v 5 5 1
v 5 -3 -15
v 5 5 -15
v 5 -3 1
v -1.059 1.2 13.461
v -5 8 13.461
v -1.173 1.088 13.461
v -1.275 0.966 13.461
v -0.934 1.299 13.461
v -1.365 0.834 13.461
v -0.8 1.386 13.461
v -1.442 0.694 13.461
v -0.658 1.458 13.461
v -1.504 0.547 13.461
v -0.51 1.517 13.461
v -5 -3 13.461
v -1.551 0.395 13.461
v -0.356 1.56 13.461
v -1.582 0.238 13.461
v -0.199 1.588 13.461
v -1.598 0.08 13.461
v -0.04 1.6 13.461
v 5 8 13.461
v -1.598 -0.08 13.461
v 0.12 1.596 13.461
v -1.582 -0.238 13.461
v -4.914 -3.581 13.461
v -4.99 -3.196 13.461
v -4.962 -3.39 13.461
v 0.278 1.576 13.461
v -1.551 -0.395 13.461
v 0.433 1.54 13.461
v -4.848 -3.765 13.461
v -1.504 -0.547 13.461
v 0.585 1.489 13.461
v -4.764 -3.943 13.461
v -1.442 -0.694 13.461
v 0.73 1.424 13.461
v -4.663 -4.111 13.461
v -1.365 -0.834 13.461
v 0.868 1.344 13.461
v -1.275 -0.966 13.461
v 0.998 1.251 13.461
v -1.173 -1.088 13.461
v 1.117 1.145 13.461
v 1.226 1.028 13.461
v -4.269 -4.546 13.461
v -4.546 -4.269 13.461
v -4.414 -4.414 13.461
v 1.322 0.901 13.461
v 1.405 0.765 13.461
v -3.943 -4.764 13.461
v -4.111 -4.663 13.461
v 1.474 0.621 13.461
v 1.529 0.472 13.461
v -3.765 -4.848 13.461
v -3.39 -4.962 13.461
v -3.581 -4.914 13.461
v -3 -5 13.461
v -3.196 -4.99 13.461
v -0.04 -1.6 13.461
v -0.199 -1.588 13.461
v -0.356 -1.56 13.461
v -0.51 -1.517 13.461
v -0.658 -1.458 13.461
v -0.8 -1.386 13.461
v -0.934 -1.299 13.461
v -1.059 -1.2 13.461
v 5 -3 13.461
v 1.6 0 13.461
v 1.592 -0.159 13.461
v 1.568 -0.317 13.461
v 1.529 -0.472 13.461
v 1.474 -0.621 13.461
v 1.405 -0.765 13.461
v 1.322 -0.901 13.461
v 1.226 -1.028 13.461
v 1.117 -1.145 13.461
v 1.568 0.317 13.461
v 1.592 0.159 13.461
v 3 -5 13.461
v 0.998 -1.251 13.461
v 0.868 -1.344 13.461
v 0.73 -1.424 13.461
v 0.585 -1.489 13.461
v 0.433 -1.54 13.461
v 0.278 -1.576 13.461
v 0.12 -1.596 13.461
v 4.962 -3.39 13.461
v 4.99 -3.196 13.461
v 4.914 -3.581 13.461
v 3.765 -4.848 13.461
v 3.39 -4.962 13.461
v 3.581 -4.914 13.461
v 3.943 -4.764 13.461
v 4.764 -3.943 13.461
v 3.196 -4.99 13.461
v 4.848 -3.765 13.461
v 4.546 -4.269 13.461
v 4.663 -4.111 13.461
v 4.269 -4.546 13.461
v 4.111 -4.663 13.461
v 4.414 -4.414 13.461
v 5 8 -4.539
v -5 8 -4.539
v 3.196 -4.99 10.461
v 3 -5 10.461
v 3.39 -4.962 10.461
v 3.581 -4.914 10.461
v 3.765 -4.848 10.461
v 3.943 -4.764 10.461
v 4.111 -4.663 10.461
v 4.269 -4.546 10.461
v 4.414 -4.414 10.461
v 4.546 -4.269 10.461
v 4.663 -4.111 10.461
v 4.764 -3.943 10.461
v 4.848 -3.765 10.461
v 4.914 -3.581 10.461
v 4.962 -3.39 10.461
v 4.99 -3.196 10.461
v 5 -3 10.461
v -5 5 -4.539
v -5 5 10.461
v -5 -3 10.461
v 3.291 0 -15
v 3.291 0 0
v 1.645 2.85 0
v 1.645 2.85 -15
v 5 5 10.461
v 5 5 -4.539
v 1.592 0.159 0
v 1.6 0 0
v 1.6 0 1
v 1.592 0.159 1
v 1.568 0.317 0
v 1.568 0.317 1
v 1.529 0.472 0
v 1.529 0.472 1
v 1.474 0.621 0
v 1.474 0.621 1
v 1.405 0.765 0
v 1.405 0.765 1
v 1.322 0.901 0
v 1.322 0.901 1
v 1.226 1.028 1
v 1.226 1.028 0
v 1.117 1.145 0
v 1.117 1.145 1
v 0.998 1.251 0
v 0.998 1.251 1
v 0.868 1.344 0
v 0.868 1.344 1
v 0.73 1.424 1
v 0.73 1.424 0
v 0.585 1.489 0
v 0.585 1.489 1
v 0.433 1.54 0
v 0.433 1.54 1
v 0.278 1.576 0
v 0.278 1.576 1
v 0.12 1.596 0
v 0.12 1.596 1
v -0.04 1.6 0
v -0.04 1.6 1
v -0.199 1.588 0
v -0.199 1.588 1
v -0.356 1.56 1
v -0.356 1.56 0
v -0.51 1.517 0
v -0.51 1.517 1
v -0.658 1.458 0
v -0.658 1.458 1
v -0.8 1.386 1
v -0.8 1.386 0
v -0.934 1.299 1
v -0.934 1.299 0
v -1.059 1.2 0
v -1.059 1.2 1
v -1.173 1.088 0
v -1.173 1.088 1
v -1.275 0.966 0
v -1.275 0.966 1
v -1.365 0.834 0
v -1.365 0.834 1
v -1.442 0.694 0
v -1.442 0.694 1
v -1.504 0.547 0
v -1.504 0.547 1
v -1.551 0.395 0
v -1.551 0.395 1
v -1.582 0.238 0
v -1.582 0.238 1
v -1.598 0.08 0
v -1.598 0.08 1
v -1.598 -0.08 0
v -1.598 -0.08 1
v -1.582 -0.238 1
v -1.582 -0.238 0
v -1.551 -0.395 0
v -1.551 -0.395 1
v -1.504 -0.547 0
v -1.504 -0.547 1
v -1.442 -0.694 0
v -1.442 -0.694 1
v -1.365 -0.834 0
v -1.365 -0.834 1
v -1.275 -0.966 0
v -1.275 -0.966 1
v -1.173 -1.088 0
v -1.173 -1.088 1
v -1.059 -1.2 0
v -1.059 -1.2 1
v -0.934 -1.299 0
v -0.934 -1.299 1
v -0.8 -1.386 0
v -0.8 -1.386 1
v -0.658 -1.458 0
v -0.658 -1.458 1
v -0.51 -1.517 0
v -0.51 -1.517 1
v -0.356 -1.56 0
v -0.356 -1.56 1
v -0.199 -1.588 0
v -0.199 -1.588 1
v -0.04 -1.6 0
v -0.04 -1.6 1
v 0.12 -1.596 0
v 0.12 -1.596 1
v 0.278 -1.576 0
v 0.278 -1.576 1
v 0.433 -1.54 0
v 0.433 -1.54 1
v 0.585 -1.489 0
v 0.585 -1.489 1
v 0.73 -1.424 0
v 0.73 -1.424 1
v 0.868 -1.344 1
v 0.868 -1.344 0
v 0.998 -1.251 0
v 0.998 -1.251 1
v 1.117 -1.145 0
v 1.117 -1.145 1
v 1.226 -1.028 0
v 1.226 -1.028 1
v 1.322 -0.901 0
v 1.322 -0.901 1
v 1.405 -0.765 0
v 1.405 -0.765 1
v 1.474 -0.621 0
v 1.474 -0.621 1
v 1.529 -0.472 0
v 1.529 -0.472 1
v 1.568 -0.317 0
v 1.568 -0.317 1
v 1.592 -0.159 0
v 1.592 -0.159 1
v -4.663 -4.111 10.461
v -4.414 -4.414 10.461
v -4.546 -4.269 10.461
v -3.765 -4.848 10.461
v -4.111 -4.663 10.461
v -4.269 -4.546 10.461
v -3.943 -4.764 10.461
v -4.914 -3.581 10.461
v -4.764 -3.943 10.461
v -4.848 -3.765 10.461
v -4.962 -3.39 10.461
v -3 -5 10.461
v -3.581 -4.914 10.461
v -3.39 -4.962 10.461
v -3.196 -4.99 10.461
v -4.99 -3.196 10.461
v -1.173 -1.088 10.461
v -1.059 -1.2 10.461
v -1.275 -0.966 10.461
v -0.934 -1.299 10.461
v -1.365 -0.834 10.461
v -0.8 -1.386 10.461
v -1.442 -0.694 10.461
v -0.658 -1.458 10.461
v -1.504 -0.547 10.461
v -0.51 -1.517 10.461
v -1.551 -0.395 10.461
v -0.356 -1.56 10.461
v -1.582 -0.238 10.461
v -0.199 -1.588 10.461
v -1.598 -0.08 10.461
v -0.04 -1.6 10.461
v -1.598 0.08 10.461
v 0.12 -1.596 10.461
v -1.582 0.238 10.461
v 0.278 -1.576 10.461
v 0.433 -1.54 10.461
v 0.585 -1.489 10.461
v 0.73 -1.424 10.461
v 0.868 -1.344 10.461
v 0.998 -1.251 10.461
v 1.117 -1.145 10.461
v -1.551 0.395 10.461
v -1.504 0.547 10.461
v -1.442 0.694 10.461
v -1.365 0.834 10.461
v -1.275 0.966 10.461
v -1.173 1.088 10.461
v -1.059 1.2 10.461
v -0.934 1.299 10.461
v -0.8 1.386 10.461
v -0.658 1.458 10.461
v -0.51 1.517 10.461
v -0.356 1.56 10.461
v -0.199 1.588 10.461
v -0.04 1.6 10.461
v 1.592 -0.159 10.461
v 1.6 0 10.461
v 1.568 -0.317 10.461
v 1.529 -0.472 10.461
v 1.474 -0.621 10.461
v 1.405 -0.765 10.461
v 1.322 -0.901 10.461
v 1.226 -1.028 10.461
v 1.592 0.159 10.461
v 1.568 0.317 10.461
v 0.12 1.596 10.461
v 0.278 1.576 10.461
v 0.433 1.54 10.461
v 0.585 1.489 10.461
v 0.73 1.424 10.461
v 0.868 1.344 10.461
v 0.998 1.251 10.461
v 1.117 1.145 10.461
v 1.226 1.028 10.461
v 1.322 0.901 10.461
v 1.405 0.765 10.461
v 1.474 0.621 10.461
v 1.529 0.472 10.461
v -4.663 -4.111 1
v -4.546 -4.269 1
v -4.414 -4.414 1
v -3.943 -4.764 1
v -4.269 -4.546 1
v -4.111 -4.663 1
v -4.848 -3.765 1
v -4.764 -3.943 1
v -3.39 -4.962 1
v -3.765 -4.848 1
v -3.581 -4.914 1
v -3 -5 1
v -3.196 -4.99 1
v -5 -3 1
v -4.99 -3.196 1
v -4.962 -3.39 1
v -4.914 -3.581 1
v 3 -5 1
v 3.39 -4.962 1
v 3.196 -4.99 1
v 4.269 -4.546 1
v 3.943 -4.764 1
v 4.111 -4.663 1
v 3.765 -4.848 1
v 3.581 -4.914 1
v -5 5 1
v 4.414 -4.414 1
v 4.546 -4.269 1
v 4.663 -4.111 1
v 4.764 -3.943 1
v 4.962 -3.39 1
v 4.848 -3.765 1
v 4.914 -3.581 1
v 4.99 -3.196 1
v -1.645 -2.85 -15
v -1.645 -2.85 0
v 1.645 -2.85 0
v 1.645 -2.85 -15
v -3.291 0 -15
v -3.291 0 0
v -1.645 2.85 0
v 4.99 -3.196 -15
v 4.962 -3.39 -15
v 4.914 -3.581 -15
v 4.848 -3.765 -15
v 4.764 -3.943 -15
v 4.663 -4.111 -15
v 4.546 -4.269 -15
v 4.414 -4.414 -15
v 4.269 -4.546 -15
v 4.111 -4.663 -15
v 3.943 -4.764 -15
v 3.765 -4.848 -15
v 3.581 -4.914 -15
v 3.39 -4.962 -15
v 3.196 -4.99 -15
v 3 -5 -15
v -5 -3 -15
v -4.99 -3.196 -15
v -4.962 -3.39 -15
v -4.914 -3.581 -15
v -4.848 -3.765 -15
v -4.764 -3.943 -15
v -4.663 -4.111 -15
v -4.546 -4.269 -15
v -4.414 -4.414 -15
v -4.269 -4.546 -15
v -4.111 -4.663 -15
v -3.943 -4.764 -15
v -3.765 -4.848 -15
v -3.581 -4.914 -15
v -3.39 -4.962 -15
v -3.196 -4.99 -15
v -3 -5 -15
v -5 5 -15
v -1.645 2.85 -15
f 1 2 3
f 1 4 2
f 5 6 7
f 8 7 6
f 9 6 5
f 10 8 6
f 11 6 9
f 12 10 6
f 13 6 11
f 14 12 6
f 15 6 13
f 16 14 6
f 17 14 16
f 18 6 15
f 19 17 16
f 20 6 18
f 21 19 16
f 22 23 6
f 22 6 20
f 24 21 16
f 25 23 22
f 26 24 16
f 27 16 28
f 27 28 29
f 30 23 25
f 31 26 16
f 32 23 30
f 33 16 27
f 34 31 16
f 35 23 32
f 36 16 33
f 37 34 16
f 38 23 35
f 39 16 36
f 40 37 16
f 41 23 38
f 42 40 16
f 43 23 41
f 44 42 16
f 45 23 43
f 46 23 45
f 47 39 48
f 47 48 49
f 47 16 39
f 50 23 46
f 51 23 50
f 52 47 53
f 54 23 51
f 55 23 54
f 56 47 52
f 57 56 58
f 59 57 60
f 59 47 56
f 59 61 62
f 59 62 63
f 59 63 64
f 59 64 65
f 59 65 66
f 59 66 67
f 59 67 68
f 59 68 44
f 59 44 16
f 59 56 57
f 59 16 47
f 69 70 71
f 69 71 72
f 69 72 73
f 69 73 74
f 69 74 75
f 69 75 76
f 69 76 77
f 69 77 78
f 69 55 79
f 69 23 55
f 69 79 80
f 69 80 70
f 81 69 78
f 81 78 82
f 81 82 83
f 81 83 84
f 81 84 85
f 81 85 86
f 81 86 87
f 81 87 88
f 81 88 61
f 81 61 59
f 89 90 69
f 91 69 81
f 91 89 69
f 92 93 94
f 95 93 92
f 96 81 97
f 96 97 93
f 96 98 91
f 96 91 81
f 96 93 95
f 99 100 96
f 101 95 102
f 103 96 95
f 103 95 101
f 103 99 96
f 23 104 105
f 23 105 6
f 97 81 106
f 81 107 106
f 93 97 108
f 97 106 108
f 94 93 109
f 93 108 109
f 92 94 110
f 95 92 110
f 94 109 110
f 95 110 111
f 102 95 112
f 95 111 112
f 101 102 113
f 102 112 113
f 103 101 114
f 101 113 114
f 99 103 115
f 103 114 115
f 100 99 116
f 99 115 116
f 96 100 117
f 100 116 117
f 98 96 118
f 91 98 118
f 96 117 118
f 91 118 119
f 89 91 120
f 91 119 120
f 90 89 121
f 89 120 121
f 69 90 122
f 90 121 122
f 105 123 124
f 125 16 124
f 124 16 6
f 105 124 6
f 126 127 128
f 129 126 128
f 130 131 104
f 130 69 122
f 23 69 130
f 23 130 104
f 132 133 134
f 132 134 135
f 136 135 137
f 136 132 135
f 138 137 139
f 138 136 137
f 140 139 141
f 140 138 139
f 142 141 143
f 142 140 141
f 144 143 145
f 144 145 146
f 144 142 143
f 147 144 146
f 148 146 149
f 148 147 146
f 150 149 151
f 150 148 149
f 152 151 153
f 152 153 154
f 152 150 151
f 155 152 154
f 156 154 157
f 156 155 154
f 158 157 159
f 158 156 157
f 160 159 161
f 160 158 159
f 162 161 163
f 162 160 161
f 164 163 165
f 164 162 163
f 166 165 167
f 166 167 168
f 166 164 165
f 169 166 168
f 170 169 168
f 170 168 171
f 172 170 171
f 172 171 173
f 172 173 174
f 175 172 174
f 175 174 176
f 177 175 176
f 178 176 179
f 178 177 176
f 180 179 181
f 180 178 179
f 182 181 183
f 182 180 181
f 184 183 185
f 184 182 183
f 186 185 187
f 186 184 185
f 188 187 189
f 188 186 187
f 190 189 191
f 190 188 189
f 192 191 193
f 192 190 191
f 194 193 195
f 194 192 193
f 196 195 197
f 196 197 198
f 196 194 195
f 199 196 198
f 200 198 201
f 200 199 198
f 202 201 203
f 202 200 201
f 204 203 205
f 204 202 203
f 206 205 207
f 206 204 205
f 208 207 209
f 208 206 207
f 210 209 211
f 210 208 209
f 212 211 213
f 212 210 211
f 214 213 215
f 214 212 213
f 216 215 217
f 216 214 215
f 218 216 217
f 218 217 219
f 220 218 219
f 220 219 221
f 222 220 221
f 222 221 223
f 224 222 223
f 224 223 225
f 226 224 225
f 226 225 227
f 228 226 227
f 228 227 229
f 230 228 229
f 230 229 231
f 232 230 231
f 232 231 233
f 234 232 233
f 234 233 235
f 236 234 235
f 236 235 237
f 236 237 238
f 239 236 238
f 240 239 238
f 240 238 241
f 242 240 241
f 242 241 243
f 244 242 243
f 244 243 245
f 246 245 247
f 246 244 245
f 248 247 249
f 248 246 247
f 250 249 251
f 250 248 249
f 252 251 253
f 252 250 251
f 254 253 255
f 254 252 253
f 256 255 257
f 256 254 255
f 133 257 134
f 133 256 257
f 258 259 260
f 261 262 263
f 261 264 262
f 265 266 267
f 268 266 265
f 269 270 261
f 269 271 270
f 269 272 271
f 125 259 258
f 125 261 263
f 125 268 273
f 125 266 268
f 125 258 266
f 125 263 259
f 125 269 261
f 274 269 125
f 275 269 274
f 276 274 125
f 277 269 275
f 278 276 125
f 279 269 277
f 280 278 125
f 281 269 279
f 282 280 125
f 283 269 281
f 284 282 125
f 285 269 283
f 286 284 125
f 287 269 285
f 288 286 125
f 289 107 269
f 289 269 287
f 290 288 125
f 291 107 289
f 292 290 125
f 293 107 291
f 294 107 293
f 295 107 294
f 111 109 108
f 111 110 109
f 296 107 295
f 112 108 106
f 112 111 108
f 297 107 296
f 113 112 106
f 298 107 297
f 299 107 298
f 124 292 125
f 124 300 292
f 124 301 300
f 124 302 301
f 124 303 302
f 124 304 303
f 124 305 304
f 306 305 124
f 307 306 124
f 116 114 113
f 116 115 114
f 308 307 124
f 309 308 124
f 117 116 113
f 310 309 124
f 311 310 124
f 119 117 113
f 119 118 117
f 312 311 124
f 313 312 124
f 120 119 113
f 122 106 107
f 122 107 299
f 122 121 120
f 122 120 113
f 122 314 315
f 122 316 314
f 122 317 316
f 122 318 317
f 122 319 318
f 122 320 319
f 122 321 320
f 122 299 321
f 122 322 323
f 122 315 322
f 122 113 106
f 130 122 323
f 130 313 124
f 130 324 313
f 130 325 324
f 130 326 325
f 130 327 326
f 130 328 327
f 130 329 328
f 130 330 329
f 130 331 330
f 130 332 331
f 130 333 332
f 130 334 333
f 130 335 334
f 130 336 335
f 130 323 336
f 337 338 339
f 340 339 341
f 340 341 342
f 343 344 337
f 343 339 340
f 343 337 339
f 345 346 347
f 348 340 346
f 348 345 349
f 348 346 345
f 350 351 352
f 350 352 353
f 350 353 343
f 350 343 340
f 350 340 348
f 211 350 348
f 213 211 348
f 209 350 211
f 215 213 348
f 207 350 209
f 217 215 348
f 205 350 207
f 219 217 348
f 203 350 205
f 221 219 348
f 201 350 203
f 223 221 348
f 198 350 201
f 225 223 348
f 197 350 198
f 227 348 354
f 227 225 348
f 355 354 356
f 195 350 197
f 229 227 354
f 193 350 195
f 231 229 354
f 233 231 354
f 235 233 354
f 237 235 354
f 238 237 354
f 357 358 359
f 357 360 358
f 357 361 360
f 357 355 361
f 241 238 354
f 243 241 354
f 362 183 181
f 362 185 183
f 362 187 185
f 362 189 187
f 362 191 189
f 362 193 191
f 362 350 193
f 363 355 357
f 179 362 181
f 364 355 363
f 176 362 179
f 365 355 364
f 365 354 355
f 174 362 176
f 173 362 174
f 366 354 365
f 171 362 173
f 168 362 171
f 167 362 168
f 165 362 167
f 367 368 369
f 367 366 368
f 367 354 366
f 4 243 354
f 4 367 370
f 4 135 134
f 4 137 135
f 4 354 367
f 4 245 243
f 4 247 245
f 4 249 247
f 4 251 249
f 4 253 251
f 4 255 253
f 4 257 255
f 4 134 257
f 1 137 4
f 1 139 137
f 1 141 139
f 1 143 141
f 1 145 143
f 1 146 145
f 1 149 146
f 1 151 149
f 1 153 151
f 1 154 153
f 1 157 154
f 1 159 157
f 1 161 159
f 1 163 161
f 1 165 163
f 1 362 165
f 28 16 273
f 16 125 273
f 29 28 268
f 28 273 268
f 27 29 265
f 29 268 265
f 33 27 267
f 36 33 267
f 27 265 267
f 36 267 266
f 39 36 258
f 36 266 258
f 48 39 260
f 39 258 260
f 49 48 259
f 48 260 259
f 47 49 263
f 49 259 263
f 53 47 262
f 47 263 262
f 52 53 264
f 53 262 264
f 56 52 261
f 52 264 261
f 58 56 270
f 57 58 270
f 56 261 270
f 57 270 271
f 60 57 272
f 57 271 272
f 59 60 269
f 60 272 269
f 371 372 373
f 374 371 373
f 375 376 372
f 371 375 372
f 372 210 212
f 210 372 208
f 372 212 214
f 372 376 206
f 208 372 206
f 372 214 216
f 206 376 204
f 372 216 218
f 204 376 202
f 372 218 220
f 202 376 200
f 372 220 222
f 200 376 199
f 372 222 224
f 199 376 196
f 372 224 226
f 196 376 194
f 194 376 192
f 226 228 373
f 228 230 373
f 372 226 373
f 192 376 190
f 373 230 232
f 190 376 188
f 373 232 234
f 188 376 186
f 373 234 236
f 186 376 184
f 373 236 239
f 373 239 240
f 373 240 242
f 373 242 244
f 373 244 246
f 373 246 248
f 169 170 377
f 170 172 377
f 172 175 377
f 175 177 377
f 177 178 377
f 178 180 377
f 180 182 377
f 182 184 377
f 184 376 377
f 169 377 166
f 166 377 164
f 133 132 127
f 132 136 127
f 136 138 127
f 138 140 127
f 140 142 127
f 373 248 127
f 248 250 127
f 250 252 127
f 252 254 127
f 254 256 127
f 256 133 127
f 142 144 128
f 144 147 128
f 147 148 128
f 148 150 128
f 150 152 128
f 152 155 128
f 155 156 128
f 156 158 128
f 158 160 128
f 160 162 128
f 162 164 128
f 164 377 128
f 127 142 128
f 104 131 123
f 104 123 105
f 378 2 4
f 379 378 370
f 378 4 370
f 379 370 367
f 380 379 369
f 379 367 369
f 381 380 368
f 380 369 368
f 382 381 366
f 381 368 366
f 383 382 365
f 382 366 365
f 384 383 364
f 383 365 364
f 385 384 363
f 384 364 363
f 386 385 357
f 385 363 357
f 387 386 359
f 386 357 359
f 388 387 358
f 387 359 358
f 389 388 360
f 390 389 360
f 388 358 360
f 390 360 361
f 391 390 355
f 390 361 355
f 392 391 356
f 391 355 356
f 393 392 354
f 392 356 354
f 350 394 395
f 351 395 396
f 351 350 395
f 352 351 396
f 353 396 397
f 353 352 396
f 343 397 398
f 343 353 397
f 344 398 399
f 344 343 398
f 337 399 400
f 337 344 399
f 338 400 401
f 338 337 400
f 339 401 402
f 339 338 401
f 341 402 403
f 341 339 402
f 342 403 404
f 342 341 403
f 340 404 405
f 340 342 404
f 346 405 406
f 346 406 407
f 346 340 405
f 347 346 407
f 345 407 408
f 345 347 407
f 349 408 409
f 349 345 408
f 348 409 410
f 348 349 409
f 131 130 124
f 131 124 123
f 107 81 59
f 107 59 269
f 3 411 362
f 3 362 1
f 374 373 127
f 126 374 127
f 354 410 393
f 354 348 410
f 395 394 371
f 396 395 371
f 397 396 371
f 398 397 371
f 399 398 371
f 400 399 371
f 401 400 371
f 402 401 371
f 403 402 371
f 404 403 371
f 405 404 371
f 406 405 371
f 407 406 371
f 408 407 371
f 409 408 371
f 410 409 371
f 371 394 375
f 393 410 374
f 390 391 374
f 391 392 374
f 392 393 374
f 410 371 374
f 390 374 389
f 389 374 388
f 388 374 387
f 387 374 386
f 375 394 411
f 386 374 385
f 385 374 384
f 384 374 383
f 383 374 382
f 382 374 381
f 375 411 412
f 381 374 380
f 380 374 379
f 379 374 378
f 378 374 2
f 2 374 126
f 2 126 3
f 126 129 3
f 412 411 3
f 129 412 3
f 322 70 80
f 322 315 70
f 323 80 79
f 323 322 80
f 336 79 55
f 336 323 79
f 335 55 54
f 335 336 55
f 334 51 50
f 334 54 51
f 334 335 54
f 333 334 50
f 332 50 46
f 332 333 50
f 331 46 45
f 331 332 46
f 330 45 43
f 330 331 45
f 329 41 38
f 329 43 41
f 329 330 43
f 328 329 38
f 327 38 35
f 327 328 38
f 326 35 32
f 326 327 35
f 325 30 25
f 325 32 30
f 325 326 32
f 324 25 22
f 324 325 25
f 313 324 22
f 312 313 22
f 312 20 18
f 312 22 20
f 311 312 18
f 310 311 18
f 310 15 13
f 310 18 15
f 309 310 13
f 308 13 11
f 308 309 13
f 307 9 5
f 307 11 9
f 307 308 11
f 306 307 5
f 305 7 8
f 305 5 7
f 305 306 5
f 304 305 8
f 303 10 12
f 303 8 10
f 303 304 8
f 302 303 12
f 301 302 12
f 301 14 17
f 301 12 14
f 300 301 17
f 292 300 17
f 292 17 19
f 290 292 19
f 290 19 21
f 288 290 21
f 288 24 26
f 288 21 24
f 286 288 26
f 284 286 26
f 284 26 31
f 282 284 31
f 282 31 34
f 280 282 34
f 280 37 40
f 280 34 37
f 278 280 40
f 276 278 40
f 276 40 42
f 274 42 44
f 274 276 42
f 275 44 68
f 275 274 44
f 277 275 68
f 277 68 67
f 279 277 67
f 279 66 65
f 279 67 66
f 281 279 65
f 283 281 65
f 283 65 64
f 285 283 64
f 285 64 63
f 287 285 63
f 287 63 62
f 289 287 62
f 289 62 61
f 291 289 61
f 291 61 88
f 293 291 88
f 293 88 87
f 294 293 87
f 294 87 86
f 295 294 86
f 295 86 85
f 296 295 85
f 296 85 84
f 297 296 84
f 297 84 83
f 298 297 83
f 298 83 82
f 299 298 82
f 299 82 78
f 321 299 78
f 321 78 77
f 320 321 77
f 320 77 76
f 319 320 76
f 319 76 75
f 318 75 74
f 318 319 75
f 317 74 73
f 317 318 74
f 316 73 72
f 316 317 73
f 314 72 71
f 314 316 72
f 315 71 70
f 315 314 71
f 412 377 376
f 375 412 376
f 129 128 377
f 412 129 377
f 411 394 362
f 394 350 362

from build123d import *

# Parameters (mm, degrees)
SKETCH_W     = 10
SKETCH_H     = 10
SKETCH_R     = 1.6
PAD_DEPTH    = 1
SKETCH001_W  = 10
SKETCH001_H  = 10
PAD001_DEPTH = 15
FILLET001_R  = 2
PAD002_DEPTH = 5
SKETCH003_R  = 1.6
POCKET_DEPTH = 13.461834
FILLET_R     = 2


with BuildPart() as fix:
    # Sketch → Pad (new body)
    with BuildSketch(Plane.XY):
        Rectangle(SKETCH_W, SKETCH_H)
        Circle(SKETCH_R, mode=Mode.SUBTRACT)
    extrude(amount=PAD_DEPTH)

    # Sketch001 → Pad001 (join)
    with BuildSketch(Plane.XY):
        Rectangle(SKETCH001_W, SKETCH001_H)
        Polygon((1.645448, 2.85), (-1.645448, 2.85), (-3.290897, 0), (-1.645448, -2.85), (1.645448, -2.85), (3.290897, 0), align=None, mode=Mode.SUBTRACT)
    extrude(amount=-PAD001_DEPTH)

    # Fillet001
    fillet001_edges = [fix.edges().sort_by_distance(p)[0] for p in [
        (5, -5, 0.5),
        (5, -5, -7.5),
        (-5, -5, -7.5),
        (-5, -5, 0.5),
    ]]
    fillet(fillet001_edges, radius=FILLET001_R)


with BuildPart() as move:
    # Sketch002 → Pad002 (new body, symmetric)
    with BuildSketch(Plane.YZ):
        Polygon((-5, 10.460834), (5, 10.460834), (5, -4.539166), (8, -4.539166), (8, 13.460834), (-5, 13.460834), align=None)
    extrude(amount=PAD002_DEPTH, both=True)

    # Sketch003 → Pocket (cut, through all)
    with BuildSketch(Plane.XY):
        Circle(SKETCH003_R)
    extrude(amount=POCKET_DEPTH, mode=Mode.SUBTRACT)

    # Fillet
    fillet_edges = [move.edges().sort_by_distance(p)[0] for p in [
        (-5, -5, 11.960834),
        (5, -5, 11.960834),
    ]]
    fillet(fillet_edges, radius=FILLET_R)


solid = Compound([fix.part, move.part])
